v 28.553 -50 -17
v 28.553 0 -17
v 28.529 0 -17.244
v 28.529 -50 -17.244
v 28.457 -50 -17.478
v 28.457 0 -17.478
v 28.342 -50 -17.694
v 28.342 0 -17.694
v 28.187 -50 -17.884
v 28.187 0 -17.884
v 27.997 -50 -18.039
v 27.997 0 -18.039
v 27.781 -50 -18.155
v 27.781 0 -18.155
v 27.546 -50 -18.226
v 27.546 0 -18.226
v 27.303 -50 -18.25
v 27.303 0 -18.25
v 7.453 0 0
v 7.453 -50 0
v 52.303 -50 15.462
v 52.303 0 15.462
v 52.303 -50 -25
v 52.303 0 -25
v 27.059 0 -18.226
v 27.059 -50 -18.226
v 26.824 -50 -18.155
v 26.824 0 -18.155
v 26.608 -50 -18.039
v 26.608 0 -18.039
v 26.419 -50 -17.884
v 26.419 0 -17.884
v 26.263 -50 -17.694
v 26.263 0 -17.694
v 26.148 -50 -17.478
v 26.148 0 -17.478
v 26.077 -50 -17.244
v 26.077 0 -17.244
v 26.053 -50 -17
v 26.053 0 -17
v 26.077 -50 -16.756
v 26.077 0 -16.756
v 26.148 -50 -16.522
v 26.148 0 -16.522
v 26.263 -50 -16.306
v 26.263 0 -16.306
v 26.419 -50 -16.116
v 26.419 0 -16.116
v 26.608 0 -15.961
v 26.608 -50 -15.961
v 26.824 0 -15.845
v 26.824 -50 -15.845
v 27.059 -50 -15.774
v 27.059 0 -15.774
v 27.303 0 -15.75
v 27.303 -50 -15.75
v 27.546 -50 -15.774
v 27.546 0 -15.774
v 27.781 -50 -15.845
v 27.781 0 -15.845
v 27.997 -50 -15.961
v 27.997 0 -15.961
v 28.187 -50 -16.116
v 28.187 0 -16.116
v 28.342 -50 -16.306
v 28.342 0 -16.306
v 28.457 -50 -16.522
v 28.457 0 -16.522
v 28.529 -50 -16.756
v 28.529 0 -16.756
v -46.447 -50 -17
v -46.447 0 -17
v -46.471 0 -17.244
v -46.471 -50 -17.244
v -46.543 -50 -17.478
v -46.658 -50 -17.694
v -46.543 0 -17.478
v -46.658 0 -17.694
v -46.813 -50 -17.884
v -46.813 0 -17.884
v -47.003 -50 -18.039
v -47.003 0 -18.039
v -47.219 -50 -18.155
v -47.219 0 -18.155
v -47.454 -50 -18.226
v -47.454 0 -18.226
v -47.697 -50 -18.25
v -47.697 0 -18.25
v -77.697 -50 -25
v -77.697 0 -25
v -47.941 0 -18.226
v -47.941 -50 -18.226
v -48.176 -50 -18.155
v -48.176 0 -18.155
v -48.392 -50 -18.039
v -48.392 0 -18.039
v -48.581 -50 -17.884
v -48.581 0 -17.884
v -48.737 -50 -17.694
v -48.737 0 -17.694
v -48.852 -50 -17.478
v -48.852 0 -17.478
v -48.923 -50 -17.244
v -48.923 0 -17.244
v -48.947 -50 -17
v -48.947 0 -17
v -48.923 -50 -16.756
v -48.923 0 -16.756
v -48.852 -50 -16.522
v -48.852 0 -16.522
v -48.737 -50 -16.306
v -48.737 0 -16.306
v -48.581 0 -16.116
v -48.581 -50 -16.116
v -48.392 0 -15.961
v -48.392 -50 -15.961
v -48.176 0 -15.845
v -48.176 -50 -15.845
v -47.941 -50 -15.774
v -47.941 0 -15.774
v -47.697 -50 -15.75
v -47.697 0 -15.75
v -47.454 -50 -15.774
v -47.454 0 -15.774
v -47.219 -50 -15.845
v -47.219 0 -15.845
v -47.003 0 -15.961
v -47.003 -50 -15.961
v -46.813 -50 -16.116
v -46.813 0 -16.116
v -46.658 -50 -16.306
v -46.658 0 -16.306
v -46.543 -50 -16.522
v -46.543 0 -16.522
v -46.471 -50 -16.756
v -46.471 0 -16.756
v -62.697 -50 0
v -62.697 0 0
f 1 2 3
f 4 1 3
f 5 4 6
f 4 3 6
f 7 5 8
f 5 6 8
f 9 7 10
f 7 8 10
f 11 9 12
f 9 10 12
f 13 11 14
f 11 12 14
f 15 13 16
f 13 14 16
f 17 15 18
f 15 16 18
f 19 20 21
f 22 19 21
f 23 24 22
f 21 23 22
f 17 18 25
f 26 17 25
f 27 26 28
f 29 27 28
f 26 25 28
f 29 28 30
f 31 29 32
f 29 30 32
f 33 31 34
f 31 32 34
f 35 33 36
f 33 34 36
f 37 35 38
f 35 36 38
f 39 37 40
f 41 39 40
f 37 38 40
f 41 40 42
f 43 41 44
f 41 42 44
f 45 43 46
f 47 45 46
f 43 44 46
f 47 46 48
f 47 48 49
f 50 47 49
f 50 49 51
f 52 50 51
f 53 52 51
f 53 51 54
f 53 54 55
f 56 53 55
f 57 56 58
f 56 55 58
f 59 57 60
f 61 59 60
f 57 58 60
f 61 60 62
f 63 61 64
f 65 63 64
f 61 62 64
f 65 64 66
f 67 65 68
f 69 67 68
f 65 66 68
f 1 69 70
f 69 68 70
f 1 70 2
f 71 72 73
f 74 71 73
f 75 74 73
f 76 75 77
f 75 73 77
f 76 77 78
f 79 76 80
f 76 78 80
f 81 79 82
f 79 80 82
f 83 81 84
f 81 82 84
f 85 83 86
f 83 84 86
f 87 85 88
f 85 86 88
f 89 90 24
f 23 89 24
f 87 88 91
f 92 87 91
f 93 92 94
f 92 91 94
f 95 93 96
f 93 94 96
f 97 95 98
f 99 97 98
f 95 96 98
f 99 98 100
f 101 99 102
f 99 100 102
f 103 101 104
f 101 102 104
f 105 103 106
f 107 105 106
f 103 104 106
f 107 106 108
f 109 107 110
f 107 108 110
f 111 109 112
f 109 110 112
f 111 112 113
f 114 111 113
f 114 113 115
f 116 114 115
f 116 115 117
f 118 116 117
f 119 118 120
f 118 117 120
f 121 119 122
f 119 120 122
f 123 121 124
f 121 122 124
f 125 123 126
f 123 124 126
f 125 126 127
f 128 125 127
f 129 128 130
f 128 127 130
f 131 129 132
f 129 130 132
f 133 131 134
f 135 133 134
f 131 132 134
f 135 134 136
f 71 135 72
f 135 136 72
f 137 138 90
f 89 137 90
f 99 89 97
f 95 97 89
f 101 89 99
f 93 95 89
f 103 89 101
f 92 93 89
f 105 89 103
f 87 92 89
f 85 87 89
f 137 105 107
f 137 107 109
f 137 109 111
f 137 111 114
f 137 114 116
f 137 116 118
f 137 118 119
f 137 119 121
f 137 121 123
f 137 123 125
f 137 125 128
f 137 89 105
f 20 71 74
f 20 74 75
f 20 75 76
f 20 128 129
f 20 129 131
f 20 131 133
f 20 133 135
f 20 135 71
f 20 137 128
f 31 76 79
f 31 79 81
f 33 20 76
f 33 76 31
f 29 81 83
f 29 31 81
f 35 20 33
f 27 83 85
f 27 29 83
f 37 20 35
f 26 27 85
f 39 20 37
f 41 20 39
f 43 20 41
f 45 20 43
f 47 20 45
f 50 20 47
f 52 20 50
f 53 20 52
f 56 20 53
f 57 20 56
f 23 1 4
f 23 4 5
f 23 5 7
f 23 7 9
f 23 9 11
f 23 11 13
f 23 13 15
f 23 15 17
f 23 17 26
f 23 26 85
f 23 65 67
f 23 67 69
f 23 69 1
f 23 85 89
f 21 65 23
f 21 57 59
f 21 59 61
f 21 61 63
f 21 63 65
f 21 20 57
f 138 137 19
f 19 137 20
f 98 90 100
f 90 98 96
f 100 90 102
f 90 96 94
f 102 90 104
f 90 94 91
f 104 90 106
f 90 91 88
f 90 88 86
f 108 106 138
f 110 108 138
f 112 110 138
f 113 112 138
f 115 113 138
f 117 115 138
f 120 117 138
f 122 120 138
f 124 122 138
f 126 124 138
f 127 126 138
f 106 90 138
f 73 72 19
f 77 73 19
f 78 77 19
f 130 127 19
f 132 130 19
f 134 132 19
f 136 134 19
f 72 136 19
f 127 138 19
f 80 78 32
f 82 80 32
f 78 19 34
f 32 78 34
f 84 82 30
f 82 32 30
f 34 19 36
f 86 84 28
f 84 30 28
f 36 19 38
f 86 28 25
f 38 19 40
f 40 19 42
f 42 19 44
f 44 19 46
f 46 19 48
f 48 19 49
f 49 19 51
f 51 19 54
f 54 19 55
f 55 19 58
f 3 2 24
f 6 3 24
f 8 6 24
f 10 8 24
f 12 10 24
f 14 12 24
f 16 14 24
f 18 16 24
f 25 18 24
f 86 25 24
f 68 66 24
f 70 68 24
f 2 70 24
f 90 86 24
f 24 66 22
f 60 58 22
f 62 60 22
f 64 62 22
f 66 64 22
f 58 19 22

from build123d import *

# Parameters (mm, degrees)
F1_DEPTH = 50
F3_DEPTH = 50.001


with BuildPart() as f1:
    # F0 (on Front) → F1 (new body)
    with BuildSketch(Plane.XZ):
        Polygon((52.302633, -25), (52.302633, 25), (-47.697367, 25), (-77.697367, -25), (-47.697367, -25), (27.302633, -25), align=None)
        with BuildLine():
            ThreePointArc((-47.697367, -18.25), (-48.581251, -16.116117), (-46.447367, -17))
            ThreePointArc((-46.447367, -17), (-46.813484, -17.883883), (-47.697367, -18.25))
        make_face(mode=Mode.SUBTRACT)
        with BuildLine():
            ThreePointArc((27.302633, -18.25), (26.418749, -16.116117), (28.552633, -17))
            ThreePointArc((28.552633, -17), (28.186516, -17.883883), (27.302633, -18.25))
        make_face(mode=Mode.SUBTRACT)
    extrude(amount=F1_DEPTH)

    # F2 (on face) → F3 (cut, through all)
    with BuildSketch(Plane.XZ.offset(50)):
        Polygon((-47.697367, 25), (-62.697367, 0), (-28.942954, 0), (7.452939, 0), (52.302633, 15.462308), (52.302633, 25), align=None)
    extrude(amount=-F3_DEPTH, mode=Mode.SUBTRACT)


solid = f1.part
